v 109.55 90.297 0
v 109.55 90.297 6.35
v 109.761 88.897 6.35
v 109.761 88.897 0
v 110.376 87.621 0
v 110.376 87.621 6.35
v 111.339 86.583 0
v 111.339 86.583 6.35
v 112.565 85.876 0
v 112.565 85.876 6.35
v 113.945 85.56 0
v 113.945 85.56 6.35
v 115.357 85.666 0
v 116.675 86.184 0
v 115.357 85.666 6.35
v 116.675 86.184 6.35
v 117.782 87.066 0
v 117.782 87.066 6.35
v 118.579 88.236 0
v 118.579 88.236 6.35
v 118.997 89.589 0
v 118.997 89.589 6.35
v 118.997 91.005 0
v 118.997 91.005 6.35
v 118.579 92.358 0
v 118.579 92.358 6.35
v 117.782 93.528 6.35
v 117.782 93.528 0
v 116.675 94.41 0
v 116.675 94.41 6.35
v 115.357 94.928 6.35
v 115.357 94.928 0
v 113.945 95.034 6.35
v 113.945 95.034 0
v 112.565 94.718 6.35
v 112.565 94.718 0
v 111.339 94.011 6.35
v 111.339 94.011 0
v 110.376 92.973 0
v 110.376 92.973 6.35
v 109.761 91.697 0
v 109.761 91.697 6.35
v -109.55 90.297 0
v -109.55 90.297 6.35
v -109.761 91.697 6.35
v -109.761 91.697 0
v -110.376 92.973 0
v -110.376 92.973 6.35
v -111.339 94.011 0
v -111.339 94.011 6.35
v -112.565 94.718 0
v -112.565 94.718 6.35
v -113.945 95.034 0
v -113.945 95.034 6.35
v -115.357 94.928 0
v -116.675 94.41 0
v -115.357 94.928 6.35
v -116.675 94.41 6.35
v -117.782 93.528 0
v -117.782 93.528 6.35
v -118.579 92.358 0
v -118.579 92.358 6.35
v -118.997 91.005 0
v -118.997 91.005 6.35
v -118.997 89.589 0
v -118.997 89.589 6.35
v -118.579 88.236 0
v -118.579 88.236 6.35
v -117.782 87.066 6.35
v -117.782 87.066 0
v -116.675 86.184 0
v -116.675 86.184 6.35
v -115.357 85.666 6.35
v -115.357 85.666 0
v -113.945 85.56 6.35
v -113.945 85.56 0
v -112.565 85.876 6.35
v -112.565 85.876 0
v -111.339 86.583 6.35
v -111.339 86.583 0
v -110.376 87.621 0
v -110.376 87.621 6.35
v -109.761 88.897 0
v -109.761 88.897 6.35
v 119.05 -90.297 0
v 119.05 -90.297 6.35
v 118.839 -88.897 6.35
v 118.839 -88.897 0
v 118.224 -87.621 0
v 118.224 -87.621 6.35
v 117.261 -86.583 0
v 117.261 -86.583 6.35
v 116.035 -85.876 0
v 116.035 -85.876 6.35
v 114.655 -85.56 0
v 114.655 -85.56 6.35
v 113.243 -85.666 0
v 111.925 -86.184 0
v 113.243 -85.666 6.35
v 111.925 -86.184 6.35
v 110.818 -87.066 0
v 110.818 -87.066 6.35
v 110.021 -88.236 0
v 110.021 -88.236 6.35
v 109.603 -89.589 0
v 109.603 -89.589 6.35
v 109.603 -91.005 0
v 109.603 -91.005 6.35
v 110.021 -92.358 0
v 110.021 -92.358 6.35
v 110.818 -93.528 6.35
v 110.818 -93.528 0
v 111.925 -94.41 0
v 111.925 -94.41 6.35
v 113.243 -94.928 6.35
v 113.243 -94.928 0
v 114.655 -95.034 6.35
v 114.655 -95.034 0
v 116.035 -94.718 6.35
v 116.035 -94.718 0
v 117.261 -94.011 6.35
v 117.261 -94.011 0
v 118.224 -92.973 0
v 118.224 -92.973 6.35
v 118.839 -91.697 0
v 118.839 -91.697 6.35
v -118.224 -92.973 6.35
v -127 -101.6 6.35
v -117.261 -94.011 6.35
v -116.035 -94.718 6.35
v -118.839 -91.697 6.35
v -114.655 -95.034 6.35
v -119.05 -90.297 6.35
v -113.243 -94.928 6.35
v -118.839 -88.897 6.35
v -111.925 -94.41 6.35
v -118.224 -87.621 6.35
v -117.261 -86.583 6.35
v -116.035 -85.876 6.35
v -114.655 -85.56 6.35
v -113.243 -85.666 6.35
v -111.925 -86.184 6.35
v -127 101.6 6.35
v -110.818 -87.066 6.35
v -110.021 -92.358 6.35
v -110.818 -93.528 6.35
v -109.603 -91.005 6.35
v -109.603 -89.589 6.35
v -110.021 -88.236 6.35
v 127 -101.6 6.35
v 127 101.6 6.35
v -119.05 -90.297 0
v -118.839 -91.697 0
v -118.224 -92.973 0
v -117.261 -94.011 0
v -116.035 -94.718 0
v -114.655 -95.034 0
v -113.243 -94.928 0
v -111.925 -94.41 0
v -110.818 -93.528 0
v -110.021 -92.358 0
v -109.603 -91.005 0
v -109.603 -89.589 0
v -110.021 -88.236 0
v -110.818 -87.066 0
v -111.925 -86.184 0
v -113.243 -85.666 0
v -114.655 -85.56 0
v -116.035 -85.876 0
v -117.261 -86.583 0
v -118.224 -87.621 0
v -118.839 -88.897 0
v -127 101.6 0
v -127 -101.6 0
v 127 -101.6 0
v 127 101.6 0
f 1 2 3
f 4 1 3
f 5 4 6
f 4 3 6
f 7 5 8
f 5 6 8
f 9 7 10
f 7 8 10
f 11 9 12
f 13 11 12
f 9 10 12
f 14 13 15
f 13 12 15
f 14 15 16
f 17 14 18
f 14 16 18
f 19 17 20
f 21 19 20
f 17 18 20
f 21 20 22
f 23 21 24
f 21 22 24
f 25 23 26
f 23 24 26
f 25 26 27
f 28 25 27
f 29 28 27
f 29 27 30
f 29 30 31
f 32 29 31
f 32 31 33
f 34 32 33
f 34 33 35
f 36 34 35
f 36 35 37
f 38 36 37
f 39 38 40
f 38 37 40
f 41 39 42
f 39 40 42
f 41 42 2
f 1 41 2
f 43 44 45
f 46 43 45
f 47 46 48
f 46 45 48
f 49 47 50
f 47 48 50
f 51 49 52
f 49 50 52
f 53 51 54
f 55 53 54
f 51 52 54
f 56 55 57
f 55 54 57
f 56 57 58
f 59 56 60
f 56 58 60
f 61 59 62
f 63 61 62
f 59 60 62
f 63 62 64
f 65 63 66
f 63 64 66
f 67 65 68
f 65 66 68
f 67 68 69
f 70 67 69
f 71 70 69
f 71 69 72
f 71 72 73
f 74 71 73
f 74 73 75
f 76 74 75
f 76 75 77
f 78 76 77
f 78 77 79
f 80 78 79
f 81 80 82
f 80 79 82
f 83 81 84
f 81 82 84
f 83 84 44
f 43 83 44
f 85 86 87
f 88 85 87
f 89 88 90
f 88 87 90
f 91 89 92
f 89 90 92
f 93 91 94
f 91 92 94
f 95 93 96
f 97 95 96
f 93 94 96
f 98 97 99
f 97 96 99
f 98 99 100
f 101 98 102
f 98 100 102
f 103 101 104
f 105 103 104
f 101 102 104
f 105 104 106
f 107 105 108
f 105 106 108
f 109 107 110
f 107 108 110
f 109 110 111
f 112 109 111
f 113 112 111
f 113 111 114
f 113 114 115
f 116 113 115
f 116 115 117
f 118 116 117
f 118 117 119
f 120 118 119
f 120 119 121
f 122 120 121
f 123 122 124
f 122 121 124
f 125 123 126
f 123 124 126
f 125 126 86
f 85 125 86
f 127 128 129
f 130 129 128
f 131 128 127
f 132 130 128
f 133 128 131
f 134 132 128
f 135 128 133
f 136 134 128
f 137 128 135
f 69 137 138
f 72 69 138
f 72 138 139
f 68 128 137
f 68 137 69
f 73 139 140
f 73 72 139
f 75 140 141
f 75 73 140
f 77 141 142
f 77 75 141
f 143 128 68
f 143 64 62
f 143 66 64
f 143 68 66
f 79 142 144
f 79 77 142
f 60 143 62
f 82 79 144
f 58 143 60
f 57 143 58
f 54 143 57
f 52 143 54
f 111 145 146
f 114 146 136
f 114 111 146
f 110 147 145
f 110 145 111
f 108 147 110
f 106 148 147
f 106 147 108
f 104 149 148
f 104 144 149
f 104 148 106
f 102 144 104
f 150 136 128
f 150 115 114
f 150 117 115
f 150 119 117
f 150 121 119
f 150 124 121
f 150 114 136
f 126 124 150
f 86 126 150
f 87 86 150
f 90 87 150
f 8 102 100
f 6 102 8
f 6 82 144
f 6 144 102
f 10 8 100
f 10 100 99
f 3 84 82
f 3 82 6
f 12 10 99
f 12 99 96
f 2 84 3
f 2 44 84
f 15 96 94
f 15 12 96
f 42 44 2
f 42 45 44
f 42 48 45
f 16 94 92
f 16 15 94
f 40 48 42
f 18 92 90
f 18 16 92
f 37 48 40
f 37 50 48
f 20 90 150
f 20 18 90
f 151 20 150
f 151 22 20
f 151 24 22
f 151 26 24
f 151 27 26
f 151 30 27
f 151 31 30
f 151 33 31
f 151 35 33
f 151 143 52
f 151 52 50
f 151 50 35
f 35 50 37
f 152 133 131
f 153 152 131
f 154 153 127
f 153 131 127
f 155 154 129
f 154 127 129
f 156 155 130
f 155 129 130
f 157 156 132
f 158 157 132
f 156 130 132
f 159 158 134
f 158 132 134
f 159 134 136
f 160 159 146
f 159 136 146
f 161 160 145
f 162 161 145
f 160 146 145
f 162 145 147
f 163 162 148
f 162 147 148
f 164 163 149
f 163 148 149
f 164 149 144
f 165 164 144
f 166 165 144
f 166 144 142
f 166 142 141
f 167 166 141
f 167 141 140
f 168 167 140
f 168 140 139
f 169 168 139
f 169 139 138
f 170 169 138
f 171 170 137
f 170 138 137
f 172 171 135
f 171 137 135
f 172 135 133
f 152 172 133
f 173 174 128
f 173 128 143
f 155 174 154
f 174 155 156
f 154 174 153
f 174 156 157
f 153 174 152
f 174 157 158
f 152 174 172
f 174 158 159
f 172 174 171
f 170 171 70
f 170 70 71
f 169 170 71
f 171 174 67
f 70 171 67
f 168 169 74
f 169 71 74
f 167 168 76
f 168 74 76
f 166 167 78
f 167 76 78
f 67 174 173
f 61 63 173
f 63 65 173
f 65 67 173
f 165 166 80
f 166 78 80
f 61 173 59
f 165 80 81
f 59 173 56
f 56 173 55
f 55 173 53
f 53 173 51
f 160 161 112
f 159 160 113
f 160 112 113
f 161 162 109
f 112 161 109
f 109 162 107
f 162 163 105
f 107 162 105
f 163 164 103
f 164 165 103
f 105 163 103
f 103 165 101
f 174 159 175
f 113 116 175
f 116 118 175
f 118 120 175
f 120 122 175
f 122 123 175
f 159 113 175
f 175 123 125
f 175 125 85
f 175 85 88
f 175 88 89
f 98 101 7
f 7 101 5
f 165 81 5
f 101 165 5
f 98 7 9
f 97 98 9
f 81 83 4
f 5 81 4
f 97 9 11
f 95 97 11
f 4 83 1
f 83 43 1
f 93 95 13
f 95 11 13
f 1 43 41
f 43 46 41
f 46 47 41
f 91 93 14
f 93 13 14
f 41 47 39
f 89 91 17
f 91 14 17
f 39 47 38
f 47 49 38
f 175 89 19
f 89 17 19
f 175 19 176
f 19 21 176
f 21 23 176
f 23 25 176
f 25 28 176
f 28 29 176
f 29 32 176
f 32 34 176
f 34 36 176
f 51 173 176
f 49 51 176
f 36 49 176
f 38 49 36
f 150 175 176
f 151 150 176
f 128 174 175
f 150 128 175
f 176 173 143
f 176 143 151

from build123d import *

# Parameters (mm, degrees)
SKETCH1_W           = 254
SKETCH1_H           = 203.2
BOSS_EXTRUDE1_DEPTH = 6.35
SKETCH2_R           = 4.7498
CUT_EXTRUDE2_DEPTH  = 6.35


with BuildPart() as part:
    # Sketch1 → Boss-Extrude1 (new body)
    with BuildSketch(Plane.XY):
        Rectangle(SKETCH1_W, SKETCH1_H)
    extrude(amount=BOSS_EXTRUDE1_DEPTH)

    # Sketch2 → Cut-Extrude2 (cut)
    with BuildSketch(Plane.XY.offset(6.35)):
        with Locations((114.3, -90.297)):
            Circle(SKETCH2_R)
        with Locations(Location((-114.3, -90.297, 0), (0, 0, 180))):
            Circle(SKETCH2_R)
        with Locations(Location((114.3, 90.297, 0), (0, 0, 180))):
            Circle(SKETCH2_R)
        with Locations((-114.3, 90.297)):
            Circle(SKETCH2_R)
    extrude(amount=-CUT_EXTRUDE2_DEPTH, mode=Mode.SUBTRACT)


solid = part.part
